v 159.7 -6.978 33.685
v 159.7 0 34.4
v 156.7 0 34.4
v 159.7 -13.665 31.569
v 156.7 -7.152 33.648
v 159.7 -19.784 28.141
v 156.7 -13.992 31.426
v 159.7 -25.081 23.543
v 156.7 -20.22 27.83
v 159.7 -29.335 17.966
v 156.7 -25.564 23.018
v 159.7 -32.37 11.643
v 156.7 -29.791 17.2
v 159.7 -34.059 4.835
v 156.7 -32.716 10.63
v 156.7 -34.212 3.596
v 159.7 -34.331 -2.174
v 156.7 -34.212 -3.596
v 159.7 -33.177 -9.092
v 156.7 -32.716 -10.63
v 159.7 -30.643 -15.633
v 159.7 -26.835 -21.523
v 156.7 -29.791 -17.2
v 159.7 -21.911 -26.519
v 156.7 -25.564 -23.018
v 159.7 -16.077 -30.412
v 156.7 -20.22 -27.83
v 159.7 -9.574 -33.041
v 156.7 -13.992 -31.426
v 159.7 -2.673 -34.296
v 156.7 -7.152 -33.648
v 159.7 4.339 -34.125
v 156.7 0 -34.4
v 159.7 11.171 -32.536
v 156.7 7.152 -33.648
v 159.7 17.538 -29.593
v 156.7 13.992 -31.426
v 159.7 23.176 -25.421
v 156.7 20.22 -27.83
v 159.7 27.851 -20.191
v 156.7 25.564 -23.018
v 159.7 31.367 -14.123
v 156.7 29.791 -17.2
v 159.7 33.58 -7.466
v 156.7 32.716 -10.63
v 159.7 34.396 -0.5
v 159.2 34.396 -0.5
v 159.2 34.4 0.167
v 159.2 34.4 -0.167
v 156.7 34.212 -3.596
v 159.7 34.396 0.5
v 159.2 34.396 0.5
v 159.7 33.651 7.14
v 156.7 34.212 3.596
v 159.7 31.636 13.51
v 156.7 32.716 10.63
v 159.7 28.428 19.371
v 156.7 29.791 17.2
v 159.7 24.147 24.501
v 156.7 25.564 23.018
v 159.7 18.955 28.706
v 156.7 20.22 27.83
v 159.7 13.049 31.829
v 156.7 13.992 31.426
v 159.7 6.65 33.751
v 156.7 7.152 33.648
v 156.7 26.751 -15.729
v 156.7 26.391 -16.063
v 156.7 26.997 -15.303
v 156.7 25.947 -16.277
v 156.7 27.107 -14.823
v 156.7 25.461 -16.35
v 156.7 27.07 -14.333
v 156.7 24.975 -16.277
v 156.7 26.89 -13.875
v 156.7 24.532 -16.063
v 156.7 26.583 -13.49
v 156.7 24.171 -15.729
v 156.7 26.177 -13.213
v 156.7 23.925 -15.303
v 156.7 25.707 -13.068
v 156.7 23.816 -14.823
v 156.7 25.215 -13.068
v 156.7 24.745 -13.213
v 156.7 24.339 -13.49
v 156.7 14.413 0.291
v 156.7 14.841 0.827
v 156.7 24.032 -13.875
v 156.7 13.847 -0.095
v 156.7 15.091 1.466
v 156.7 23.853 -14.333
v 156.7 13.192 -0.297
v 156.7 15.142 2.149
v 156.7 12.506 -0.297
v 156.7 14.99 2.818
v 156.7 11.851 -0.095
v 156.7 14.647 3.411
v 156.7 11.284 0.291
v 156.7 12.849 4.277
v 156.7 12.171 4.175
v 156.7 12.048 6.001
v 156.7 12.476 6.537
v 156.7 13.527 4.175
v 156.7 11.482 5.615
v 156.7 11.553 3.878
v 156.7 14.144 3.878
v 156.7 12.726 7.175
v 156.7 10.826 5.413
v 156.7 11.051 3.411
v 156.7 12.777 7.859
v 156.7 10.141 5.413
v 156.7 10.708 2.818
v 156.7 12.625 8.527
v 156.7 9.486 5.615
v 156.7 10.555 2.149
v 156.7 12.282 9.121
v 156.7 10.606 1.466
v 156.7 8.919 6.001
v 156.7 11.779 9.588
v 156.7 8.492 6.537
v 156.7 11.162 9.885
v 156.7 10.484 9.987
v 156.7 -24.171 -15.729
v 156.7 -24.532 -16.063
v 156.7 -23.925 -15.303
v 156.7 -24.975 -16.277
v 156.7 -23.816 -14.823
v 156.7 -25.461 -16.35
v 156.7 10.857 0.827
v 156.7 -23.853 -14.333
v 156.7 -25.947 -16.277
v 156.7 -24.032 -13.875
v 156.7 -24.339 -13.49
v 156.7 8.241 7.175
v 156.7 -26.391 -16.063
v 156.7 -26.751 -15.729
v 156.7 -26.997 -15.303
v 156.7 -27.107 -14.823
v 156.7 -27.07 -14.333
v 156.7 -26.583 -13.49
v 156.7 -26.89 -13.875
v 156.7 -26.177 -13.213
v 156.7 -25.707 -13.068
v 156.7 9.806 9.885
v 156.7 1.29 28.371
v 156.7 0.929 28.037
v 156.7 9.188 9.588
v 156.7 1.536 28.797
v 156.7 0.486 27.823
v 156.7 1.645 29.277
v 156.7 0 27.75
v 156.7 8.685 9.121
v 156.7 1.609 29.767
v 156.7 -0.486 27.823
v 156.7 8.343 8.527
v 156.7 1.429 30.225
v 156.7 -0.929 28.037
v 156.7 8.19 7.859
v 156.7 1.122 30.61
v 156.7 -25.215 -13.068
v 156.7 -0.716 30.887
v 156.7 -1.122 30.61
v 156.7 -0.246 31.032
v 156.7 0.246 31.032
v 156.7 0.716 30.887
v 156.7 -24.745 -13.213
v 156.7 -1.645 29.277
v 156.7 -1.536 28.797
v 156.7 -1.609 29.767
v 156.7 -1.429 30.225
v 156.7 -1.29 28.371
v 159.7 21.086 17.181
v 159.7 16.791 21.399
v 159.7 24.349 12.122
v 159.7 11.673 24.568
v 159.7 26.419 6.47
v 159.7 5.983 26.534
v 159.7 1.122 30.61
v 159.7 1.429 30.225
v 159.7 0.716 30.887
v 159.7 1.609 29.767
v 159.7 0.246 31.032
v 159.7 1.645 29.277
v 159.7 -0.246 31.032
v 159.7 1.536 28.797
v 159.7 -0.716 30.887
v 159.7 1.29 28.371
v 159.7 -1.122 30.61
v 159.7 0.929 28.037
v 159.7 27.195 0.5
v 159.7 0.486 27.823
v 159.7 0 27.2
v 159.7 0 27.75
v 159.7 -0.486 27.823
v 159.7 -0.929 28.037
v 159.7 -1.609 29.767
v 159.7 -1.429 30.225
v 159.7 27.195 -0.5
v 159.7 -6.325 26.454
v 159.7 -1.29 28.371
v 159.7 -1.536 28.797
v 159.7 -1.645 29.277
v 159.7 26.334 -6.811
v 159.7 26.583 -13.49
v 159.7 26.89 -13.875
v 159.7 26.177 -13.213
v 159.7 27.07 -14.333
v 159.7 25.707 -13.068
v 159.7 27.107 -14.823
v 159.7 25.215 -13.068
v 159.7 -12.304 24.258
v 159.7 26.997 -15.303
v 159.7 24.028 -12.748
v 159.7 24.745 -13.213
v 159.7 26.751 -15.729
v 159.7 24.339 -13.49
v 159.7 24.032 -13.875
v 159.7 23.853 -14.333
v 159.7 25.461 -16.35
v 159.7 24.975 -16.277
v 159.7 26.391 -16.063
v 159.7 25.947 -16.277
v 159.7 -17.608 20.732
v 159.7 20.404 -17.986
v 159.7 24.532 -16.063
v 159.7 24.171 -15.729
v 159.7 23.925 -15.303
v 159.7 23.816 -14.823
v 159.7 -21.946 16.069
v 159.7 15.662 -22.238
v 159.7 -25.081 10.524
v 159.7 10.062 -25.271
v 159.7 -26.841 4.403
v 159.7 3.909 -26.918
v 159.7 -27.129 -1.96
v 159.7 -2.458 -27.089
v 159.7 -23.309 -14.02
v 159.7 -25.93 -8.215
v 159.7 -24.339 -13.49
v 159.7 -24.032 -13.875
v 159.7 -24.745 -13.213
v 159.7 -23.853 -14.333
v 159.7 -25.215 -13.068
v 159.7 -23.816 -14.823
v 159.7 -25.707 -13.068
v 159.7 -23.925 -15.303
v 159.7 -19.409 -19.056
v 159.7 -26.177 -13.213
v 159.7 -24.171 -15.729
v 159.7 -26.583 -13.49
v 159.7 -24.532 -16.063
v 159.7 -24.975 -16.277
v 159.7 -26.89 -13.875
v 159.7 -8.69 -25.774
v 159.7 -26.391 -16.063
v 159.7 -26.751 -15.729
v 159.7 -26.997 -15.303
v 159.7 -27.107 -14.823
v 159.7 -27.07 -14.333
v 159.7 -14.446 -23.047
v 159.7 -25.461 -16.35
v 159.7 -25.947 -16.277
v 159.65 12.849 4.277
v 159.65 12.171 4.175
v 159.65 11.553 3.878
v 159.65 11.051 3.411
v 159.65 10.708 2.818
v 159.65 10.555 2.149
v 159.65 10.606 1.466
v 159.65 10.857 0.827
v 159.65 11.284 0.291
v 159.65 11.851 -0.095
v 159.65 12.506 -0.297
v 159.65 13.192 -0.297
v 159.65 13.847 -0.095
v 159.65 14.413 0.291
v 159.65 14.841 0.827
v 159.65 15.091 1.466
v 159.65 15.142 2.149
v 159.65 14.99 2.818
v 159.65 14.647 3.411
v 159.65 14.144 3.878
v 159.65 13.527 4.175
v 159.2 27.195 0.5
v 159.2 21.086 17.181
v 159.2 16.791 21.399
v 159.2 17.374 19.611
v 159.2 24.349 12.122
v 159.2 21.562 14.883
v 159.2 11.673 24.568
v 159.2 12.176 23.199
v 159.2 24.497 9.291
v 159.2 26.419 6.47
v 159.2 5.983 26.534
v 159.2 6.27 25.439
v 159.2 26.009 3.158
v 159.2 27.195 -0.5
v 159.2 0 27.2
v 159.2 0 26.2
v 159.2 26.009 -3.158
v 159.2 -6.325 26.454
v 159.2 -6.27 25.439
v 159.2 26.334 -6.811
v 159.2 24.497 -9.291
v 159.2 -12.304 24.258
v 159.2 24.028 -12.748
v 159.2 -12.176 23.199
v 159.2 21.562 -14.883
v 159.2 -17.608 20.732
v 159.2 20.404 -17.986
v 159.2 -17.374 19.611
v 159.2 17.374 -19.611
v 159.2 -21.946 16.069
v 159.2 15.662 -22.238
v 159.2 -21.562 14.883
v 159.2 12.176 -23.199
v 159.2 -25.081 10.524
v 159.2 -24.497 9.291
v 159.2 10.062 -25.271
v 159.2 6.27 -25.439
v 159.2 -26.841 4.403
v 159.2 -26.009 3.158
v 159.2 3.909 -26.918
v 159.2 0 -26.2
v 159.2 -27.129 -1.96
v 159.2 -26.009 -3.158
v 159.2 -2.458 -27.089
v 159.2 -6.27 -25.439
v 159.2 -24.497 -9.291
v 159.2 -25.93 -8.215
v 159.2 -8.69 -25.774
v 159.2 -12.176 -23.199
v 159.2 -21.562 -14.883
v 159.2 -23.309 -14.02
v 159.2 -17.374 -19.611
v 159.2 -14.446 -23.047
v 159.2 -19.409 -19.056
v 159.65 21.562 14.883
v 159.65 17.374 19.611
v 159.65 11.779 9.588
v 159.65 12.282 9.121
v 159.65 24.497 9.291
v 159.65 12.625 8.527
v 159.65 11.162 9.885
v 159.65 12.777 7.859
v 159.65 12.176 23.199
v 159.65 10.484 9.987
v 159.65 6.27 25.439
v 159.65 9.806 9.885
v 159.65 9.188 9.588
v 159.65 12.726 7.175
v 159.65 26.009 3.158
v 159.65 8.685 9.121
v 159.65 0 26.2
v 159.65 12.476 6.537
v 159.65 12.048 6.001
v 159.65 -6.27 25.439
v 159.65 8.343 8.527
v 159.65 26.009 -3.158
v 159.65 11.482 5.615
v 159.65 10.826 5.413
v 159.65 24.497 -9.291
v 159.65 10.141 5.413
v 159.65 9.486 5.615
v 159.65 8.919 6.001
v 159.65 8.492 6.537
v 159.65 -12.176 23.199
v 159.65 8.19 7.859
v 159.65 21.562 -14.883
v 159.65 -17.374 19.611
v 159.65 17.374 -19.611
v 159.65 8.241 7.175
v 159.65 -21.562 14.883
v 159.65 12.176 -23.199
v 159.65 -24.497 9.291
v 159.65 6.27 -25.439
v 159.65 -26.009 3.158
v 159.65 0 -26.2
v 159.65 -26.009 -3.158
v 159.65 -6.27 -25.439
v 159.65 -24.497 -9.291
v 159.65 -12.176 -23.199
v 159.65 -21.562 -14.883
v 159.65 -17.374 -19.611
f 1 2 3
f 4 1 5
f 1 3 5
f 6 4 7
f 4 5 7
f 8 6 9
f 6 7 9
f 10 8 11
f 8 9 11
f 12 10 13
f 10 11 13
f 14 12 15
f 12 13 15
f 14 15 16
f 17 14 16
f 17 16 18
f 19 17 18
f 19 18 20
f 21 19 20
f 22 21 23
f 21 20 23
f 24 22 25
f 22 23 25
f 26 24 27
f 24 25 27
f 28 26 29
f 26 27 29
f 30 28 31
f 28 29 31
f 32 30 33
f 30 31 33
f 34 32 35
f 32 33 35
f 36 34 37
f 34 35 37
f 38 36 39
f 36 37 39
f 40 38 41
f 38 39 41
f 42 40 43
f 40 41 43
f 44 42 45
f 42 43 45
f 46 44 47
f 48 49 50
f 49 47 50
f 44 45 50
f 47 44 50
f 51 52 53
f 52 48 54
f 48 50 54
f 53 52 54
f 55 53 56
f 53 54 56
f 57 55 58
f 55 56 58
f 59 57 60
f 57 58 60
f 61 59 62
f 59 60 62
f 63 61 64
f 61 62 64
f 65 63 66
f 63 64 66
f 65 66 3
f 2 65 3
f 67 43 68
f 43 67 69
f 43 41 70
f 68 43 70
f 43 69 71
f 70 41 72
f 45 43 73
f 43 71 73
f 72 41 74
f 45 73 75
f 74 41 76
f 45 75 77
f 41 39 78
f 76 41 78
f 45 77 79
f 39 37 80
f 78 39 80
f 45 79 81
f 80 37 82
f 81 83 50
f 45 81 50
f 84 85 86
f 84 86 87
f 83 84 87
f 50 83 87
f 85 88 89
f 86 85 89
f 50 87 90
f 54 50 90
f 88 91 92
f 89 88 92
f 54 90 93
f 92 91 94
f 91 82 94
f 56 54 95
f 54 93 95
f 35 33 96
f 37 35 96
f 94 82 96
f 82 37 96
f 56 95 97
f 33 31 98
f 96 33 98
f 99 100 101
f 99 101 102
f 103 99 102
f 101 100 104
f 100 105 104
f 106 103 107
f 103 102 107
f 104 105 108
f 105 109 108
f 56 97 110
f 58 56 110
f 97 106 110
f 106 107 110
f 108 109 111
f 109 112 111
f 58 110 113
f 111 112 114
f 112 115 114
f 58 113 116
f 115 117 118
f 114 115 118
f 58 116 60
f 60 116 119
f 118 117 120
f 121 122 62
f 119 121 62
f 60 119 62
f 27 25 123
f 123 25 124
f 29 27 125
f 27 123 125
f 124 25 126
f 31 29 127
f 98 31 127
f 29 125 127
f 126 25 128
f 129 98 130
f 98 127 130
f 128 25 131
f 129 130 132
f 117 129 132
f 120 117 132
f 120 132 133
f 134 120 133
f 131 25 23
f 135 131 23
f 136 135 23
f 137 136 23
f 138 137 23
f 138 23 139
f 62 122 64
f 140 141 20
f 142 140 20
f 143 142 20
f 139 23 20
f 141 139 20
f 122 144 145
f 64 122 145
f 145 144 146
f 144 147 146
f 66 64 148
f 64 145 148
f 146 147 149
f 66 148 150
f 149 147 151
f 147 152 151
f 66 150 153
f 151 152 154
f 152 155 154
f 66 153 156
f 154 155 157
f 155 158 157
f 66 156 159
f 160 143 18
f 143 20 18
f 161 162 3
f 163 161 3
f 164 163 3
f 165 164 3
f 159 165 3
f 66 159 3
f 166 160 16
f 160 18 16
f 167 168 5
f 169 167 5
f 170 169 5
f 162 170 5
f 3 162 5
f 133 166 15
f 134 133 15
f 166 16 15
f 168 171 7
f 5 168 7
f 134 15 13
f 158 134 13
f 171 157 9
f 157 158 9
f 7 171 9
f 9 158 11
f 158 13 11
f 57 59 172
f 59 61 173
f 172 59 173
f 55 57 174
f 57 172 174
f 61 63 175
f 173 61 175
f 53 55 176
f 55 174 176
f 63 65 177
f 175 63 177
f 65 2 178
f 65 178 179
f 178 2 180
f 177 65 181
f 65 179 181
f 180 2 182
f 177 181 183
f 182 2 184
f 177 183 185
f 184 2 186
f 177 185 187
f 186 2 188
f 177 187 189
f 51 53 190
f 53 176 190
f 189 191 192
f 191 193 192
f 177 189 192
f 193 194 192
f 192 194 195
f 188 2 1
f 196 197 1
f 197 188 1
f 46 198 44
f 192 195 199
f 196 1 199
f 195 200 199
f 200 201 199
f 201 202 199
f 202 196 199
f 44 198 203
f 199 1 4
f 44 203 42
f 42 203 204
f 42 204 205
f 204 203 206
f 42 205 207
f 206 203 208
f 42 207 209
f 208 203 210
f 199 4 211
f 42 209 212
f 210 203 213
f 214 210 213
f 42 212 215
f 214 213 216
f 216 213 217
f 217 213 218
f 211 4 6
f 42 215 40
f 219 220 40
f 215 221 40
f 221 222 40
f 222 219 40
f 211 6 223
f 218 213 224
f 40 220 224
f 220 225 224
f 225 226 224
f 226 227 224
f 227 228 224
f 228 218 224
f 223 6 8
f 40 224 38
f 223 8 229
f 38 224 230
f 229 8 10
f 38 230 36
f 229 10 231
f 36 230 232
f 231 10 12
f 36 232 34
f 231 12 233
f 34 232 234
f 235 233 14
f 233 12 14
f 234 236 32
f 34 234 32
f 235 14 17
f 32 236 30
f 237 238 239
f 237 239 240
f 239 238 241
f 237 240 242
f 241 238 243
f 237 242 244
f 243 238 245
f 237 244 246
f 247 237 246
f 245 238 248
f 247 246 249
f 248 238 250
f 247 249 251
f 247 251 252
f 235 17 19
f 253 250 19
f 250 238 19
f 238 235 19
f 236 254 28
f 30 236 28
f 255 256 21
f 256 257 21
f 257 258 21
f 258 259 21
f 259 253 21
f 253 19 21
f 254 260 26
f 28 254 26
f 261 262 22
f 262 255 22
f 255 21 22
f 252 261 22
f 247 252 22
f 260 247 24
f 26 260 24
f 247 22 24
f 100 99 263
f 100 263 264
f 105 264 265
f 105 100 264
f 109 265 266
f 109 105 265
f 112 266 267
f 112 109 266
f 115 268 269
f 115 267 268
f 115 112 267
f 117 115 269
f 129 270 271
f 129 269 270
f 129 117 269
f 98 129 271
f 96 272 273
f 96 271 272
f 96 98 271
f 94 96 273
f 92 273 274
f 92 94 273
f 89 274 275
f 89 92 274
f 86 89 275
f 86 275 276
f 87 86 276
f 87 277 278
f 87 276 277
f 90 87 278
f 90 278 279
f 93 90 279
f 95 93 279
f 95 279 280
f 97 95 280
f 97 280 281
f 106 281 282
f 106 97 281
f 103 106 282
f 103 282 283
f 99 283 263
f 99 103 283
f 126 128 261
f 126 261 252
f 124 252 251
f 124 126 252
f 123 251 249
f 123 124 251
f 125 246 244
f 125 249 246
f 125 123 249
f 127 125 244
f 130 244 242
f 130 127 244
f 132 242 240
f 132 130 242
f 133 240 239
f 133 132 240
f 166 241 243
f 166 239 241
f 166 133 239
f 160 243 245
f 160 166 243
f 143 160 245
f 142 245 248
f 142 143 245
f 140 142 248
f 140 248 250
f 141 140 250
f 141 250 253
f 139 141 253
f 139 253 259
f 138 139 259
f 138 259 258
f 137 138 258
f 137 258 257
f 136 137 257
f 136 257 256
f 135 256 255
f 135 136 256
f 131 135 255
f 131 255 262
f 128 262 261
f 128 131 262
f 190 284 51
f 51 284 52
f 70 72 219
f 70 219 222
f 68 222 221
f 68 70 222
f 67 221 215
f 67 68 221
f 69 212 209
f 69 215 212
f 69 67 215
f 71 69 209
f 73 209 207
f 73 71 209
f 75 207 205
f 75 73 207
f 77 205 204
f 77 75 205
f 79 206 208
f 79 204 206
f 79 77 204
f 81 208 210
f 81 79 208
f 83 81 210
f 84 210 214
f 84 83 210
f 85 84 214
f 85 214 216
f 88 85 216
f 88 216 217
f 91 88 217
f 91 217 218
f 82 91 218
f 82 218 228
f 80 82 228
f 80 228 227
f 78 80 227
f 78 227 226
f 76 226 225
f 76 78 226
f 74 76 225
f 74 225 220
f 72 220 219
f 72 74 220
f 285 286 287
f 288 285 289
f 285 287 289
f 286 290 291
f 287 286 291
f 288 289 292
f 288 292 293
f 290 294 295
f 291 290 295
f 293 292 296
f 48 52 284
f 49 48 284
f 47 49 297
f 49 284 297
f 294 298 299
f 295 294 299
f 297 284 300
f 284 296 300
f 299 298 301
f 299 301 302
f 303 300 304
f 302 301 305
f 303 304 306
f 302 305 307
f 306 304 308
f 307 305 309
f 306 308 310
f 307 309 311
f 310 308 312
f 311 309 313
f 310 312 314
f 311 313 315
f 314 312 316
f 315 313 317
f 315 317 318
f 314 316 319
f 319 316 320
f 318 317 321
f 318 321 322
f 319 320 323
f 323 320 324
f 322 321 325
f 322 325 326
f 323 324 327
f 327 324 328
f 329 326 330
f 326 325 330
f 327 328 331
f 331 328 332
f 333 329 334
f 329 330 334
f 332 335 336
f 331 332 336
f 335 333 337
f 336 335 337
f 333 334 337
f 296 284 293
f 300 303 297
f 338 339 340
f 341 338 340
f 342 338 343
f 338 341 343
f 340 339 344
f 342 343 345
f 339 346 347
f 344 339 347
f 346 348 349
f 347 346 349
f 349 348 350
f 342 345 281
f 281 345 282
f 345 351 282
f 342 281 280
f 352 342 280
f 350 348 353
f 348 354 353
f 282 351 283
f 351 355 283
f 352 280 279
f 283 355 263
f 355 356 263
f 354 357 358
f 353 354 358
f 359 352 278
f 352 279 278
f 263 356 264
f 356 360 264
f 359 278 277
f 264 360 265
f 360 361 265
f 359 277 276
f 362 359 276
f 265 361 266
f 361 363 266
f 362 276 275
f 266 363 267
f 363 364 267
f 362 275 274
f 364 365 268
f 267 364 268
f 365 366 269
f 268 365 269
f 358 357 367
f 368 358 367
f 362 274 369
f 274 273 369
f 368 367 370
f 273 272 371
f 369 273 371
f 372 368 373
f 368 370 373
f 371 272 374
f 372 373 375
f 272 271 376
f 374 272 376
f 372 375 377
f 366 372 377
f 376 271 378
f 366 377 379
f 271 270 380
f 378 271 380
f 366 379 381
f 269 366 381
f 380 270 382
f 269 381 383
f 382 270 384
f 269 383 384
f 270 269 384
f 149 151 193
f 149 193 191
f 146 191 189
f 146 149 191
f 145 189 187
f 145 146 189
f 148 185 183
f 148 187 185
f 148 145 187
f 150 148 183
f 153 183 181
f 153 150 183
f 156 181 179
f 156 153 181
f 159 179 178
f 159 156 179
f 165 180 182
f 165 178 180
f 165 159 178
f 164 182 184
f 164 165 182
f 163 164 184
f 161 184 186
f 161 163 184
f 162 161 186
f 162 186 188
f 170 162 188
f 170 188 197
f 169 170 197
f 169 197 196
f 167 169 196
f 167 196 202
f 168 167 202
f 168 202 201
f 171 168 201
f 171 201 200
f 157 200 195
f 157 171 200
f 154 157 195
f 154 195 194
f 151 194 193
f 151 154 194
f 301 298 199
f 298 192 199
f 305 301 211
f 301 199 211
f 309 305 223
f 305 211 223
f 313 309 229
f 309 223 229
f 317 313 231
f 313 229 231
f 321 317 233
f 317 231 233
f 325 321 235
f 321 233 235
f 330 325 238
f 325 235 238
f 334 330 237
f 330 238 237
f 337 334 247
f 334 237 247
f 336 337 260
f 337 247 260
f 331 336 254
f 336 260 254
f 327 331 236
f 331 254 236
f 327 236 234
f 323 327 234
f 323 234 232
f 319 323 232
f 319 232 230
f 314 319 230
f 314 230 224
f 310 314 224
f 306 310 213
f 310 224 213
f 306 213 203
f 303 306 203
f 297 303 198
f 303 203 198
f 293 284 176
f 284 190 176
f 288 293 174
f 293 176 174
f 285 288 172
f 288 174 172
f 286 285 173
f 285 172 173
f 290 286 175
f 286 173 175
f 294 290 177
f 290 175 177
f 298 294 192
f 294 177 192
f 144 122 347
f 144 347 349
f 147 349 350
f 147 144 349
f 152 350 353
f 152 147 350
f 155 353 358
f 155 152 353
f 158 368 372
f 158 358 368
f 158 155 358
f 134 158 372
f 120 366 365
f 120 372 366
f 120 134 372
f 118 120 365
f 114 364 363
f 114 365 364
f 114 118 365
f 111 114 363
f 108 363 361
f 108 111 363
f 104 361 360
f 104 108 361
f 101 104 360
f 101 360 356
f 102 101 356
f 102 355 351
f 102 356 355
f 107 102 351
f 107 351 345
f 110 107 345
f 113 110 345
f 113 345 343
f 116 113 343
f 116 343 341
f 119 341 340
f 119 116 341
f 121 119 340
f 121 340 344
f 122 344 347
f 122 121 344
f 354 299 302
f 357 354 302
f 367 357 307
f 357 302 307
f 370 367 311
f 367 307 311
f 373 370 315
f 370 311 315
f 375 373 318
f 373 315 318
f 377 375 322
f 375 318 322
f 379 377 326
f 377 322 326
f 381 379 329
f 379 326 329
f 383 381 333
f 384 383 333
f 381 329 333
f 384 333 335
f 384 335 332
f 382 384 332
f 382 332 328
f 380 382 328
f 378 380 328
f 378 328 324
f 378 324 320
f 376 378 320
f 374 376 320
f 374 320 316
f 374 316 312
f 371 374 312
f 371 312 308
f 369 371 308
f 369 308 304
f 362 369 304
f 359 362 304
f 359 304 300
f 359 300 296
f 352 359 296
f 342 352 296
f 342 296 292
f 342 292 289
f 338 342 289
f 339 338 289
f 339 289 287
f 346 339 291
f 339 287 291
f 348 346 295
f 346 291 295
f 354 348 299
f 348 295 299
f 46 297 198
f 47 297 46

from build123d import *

# Parameters (mm, degrees)
AXIAL_HOLES_DEPTH                            = 167.945530039
AXIAL_HOLES_DEPTH_BACK                       = 167.945530039
SKETCH2_R                                    = 2.3
SKETCH2_R_2                                  = 1.65
DRY_START                                    = 159.2
SKETCH3_W                                    = 1
SKETCH3_H                                    = 8.8
DRY_INTERFACE_VENT_NOT_A_COOLANT_PASSA_DEPTH = 0.5


with BuildPart() as part:
    # Axial profile (mm) → Full revolution (revolve)
    with BuildSketch(Plane.XY, mode=Mode.PRIVATE) as full_revolution_sk:
        Polygon((156.7, 0), (159.65, 0), (159.65, 26.2), (159.2, 26.2), (159.2, 27.2), (159.7, 27.2), (159.7, 34.4), (156.7, 34.4), align=None)
    revolve(full_revolution_sk.sketch.rotate(Axis((-110, 0, 0), (1, 0, 0)), 90), axis=Axis((-110, 0, 0), (1, 0, 0)))

    # Sketch2 → Axial holes (cut, two sides: drawn at the far end of the back side and taken through both)
    with BuildSketch(Plane(origin=(0, 0, 0), x_dir=(0, 0, -1), z_dir=(1, 0, 0)).offset(-AXIAL_HOLES_DEPTH_BACK)):
        with Locations(Location((-1.977382665, 12.848733704, 0), (0, 0, 180))):
            Circle(SKETCH2_R)
        with Locations(Location((-7.687206041, 10.483647423, 0), (0, 0, 180))):
            Circle(SKETCH2_R)
        with Locations((-29.4, 0)):
            Circle(SKETCH2_R_2)
        with Locations((14.7, -25.461146871)):
            Circle(SKETCH2_R_2)
        with Locations((14.7, 25.461146871)):
            Circle(SKETCH2_R_2)
    extrude(amount=AXIAL_HOLES_DEPTH + AXIAL_HOLES_DEPTH_BACK, mode=Mode.SUBTRACT)

    # Sketch3 → Dry interface vent - NOT a coolant passage (cut)
    with BuildSketch(Plane(origin=(0, 0, 0), x_dir=(0, 0, -1), z_dir=(1, 0, 0)).offset(DRY_START)):
        with Locations((0, 30.6)):
            Rectangle(SKETCH3_W, SKETCH3_H)
    extrude(amount=DRY_INTERFACE_VENT_NOT_A_COOLANT_PASSA_DEPTH, mode=Mode.SUBTRACT)


solid = part.part
